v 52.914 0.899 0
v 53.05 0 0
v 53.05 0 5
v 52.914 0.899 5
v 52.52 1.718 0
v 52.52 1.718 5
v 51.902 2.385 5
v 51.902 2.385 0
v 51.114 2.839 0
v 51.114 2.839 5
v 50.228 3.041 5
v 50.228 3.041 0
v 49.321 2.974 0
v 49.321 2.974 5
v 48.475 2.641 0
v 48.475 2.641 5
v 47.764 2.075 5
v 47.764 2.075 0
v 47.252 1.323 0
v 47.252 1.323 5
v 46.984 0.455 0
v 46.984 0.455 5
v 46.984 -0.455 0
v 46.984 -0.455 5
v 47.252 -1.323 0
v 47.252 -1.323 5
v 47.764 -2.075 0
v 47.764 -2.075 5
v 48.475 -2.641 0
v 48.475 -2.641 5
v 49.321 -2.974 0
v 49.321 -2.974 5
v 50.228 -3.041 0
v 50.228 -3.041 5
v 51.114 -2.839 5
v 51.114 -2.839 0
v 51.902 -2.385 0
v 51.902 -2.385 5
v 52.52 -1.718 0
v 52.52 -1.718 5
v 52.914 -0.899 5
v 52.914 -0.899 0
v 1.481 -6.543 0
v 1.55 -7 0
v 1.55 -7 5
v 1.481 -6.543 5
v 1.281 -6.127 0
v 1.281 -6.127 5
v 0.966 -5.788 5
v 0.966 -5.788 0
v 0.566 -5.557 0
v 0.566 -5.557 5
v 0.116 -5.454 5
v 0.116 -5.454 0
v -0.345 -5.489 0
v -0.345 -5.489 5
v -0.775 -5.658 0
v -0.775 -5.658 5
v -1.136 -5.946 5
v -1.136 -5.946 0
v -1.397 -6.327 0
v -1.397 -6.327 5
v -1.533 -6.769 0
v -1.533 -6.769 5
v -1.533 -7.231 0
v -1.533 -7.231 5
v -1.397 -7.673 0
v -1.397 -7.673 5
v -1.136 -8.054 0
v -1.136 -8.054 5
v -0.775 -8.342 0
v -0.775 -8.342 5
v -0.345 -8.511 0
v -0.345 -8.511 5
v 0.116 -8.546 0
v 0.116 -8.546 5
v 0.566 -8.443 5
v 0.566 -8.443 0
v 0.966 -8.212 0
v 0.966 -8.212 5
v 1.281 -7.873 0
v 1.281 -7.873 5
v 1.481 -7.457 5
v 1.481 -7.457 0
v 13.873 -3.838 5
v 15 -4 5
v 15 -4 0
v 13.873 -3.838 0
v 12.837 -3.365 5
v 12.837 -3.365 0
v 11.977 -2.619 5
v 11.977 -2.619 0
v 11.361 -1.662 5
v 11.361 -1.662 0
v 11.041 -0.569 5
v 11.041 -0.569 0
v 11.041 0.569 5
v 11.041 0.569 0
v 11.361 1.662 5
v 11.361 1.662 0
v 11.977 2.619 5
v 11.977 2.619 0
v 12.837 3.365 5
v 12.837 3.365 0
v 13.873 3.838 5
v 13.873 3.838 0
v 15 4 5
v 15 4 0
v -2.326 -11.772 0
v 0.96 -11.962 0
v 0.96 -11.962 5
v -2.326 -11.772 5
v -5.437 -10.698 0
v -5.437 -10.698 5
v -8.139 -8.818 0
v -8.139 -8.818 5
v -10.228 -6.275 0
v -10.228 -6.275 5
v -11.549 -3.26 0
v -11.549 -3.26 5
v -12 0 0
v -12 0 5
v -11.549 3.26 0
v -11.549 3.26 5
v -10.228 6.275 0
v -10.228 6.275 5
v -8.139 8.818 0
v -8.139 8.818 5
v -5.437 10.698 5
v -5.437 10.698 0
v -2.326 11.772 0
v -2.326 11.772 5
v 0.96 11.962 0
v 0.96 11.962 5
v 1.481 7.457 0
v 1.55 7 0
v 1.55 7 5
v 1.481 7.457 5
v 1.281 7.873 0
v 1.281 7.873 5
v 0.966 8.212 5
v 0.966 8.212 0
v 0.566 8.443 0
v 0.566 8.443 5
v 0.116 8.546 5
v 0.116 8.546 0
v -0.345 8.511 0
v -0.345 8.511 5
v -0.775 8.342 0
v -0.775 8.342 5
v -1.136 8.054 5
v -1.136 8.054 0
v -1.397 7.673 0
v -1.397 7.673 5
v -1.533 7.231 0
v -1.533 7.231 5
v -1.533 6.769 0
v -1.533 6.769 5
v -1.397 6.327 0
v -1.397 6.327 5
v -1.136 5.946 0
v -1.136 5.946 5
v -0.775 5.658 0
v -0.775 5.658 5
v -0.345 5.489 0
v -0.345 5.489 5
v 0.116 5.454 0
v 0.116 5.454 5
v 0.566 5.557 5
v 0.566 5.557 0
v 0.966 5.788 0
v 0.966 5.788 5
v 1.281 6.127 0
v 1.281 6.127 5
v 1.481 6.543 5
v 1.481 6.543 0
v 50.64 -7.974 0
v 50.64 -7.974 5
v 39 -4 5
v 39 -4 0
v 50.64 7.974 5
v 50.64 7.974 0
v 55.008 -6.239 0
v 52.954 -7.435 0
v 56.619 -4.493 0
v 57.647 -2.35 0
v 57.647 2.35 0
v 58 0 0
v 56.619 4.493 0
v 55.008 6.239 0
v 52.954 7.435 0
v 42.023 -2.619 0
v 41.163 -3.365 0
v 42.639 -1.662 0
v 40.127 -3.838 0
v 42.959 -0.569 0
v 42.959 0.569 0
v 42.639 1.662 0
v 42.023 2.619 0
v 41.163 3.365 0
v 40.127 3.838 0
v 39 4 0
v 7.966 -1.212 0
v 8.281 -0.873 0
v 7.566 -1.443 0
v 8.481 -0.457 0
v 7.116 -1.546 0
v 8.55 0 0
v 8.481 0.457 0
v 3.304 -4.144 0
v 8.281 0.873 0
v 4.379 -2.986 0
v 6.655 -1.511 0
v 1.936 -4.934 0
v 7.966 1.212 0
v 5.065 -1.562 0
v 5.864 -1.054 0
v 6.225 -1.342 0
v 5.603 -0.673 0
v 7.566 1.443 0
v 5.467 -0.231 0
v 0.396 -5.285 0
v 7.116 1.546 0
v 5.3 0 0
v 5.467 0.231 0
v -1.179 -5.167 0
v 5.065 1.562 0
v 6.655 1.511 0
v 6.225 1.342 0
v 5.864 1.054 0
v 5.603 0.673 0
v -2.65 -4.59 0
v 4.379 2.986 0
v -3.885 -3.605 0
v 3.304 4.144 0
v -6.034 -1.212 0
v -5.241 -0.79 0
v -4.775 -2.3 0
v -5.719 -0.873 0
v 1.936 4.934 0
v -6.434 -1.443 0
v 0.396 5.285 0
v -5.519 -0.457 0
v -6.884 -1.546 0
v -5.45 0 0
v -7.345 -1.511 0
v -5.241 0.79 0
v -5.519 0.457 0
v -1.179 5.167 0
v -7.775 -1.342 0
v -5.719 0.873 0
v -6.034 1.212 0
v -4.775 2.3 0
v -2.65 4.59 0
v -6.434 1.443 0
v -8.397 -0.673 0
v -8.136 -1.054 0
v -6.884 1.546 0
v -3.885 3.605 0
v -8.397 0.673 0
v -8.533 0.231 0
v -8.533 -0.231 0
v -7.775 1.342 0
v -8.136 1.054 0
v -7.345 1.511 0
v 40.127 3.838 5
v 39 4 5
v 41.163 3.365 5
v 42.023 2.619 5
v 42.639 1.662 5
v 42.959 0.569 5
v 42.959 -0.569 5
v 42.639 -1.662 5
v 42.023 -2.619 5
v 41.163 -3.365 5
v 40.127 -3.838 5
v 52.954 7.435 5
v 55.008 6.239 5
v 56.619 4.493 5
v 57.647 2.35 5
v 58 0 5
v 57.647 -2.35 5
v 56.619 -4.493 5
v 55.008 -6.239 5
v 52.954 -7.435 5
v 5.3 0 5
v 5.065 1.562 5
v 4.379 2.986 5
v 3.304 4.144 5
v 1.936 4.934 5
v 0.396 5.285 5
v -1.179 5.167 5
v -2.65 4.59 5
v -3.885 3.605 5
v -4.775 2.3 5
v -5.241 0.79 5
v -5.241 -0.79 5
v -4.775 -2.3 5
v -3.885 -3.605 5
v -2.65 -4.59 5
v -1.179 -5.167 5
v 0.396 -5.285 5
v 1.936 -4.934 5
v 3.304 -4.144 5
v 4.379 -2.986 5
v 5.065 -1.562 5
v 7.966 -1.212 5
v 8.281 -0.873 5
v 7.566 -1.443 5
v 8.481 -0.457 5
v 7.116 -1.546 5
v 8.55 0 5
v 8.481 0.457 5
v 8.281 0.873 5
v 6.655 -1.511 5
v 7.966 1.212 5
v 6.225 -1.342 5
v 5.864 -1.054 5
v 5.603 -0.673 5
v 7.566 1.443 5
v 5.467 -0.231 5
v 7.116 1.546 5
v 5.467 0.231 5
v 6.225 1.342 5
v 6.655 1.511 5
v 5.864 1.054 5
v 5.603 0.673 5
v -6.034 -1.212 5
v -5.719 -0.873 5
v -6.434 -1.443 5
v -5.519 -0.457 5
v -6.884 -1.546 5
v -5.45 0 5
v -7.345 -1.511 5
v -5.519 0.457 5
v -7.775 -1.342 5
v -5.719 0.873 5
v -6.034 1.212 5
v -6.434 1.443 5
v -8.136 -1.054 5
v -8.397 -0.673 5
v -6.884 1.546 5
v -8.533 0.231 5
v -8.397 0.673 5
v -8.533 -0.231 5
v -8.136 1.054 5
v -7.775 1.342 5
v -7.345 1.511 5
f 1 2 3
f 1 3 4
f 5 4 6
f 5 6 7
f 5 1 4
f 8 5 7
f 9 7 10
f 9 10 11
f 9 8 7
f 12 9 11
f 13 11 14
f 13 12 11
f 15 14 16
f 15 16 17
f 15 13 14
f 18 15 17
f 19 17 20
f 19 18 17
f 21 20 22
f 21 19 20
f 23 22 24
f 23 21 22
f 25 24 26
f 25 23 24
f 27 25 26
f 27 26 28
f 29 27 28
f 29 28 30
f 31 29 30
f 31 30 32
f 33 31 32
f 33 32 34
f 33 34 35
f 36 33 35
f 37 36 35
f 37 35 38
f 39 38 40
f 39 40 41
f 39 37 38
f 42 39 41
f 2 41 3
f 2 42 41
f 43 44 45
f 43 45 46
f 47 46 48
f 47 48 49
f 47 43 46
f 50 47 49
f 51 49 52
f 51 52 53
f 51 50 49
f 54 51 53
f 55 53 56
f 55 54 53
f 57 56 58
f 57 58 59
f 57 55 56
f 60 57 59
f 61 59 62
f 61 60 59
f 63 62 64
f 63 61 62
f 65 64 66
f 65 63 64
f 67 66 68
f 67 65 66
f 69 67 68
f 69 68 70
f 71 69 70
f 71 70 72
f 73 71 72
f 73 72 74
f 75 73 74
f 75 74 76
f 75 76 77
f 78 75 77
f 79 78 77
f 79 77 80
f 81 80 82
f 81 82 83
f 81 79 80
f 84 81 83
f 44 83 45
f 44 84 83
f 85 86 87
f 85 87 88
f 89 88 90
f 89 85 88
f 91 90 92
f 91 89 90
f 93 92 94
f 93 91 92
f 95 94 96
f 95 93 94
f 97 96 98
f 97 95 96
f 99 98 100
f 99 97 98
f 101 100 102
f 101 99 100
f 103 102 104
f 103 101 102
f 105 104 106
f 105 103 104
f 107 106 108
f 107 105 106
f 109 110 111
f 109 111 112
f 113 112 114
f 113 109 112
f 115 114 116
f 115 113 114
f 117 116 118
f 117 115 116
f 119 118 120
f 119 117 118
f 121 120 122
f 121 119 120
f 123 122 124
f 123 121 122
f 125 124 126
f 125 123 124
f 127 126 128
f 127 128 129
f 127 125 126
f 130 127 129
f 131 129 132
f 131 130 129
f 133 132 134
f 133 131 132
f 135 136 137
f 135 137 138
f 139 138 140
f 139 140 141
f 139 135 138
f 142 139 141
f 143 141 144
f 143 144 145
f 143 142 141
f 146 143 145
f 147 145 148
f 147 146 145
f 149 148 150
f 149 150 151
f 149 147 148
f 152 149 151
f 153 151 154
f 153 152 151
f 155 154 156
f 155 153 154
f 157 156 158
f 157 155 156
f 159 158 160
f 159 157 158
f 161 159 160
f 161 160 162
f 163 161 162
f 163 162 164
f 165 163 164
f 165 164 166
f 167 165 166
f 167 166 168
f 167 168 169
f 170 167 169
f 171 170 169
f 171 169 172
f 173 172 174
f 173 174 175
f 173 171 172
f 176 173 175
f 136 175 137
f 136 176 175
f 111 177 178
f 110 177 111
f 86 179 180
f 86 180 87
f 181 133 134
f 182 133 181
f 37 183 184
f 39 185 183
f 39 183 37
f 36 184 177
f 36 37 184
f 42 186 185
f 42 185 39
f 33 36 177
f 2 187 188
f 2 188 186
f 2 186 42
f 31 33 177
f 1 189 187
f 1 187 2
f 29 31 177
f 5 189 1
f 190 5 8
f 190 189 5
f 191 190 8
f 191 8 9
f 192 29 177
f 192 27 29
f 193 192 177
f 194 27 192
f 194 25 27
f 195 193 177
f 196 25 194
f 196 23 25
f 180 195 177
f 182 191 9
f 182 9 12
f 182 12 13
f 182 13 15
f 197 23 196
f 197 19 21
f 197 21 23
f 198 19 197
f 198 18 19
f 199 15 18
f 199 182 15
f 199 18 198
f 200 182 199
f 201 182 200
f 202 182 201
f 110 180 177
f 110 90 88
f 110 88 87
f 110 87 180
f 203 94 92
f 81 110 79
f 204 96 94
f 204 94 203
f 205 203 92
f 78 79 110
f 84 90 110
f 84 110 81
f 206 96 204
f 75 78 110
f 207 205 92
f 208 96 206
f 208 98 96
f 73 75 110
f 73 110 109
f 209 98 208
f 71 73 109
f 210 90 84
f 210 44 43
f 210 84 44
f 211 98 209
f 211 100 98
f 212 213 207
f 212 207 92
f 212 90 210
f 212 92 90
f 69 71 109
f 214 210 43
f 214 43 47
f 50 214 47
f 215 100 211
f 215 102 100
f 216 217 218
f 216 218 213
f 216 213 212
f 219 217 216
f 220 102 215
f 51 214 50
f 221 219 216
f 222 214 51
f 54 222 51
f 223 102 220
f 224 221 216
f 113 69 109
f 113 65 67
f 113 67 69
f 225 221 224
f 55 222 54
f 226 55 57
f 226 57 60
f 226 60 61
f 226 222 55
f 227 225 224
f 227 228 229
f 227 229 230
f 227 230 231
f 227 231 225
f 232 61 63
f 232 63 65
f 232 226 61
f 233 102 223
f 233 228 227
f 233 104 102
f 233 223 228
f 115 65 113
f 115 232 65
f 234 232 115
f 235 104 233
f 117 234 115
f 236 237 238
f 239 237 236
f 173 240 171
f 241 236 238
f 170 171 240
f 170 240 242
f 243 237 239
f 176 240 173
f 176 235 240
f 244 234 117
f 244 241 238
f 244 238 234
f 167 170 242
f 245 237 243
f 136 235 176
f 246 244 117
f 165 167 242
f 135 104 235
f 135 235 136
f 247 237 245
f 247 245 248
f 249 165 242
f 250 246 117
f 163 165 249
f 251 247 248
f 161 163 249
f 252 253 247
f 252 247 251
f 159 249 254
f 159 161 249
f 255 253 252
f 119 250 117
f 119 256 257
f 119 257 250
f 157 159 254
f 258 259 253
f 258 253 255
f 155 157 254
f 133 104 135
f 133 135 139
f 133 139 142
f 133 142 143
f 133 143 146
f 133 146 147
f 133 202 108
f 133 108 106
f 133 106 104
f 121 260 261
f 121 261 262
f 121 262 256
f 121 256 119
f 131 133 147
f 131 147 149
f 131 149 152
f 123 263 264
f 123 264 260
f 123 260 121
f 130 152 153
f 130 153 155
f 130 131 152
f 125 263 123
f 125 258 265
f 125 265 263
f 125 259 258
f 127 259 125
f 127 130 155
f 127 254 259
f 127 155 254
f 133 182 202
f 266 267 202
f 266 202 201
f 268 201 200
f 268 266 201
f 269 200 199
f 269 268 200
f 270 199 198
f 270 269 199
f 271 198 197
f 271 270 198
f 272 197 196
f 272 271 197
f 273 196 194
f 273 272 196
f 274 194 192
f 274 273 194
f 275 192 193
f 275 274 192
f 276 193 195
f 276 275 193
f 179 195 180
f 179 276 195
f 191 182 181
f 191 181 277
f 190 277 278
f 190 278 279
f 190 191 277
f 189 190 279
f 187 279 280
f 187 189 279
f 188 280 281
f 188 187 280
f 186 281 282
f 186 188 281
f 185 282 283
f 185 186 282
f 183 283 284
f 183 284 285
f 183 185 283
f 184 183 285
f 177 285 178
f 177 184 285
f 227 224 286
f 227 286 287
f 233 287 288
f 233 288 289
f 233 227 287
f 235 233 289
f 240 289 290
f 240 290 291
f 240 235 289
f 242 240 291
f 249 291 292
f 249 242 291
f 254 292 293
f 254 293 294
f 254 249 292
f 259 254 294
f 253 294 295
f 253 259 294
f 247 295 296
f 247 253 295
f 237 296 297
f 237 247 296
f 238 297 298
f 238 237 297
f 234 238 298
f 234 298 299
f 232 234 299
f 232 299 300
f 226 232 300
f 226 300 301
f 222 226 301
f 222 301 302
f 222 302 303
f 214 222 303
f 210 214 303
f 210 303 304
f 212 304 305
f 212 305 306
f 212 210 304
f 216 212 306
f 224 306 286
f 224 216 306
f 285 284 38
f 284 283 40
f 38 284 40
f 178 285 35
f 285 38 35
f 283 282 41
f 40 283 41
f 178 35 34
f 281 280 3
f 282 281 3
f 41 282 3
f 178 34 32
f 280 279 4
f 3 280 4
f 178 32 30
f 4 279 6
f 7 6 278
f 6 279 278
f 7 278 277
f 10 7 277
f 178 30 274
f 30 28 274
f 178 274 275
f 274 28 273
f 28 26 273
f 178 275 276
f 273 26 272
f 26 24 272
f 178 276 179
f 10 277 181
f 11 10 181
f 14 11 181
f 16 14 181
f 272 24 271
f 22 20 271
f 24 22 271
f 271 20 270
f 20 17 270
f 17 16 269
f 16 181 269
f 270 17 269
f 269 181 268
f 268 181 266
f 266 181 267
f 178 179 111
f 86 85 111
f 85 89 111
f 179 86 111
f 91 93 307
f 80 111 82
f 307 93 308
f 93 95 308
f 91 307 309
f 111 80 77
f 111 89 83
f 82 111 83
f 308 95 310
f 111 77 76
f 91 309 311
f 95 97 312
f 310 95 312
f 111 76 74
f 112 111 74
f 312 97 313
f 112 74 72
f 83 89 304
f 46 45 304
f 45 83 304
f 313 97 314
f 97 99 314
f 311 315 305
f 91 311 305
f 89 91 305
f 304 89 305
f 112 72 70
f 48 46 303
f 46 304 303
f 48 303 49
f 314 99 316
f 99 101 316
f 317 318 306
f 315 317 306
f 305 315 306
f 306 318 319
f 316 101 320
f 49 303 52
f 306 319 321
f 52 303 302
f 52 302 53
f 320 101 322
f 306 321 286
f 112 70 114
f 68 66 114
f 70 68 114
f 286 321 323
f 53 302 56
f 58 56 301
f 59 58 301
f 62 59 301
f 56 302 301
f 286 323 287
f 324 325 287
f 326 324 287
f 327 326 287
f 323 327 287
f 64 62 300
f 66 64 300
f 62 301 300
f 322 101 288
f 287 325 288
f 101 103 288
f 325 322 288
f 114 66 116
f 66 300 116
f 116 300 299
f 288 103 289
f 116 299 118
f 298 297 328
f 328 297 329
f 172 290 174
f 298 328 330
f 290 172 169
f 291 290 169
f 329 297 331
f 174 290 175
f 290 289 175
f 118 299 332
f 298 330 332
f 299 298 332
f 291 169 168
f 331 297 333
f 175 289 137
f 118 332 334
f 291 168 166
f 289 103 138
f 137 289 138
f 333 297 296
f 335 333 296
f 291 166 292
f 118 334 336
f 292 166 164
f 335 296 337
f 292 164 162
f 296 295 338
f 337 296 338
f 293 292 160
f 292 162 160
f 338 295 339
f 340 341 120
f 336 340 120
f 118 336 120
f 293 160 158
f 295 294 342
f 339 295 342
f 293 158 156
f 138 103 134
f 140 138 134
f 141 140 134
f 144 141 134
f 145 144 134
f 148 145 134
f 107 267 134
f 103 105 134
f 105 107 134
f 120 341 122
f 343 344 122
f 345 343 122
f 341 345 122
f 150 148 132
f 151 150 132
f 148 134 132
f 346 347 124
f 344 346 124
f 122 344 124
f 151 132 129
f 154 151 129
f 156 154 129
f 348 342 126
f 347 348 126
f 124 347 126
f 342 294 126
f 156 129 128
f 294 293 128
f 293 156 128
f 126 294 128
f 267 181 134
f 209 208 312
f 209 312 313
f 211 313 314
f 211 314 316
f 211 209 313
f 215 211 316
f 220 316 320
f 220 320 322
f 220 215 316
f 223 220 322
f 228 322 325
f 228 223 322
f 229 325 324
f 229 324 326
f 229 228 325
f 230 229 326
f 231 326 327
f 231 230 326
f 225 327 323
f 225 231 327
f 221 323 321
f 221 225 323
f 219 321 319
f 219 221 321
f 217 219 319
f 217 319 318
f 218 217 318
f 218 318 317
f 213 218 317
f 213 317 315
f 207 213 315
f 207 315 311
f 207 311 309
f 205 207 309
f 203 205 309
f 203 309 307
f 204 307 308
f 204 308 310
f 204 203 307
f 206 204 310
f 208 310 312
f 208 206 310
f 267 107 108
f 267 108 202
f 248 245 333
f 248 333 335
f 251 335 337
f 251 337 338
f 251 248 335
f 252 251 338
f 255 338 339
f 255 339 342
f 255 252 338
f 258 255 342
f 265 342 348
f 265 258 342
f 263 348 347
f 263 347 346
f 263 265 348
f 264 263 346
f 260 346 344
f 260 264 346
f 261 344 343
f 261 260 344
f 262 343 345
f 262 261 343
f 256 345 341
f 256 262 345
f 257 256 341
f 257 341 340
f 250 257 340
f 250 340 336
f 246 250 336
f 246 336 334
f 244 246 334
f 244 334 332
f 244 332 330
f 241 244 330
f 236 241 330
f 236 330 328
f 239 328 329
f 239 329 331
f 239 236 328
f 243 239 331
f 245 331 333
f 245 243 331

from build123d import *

# Parameters (mm, degrees)
SKETCH_1_R          = 5.3
SKETCH_1_R_2        = 3.05
SKETCH_1_R_3        = 1.55
EXTRUDE_1_DEPTH     = 5
CUT_EXTRUDE_1_DEPTH = 10


with BuildPart() as part:
    # 草图1 → 凸台-拉伸1 (new body)
    with BuildSketch(Plane.XY):
        with BuildLine():
            Line((0.96, 11.961538363), (50.64, 7.974358908))
            ThreePointArc((50.64, 7.974358908), (58, 0), (50.64, -7.974358908))
            Line((50.64, -7.974358908), (0.96, -11.961538363))
            ThreePointArc((0.96, -11.961538363), (-12, 0), (0.96, 11.961538363))
        make_face()
        Circle(SKETCH_1_R, mode=Mode.SUBTRACT)
        with Locations((50, 0)):
            Circle(SKETCH_1_R_2, mode=Mode.SUBTRACT)
        with Locations((-7, 0)):
            Circle(SKETCH_1_R_3, mode=Mode.SUBTRACT)
        with Locations((7, 0)):
            Circle(SKETCH_1_R_3, mode=Mode.SUBTRACT)
        with Locations((0, 7)):
            Circle(SKETCH_1_R_3, mode=Mode.SUBTRACT)
        with Locations((0, -7)):
            Circle(SKETCH_1_R_3, mode=Mode.SUBTRACT)
    extrude(amount=EXTRUDE_1_DEPTH)

    # 草图2 → 切除-拉伸1 (cut)
    with BuildSketch(Plane.XY.offset(5)):
        with BuildLine():
            Line((15, 4), (39, 4))
            ThreePointArc((39, 4), (43, 0), (39, -4))
            Line((39, -4), (15, -4))
            ThreePointArc((15, -4), (11, 0), (15, 4))
        make_face()
    extrude(amount=-CUT_EXTRUDE_1_DEPTH, mode=Mode.SUBTRACT)


solid = part.part
